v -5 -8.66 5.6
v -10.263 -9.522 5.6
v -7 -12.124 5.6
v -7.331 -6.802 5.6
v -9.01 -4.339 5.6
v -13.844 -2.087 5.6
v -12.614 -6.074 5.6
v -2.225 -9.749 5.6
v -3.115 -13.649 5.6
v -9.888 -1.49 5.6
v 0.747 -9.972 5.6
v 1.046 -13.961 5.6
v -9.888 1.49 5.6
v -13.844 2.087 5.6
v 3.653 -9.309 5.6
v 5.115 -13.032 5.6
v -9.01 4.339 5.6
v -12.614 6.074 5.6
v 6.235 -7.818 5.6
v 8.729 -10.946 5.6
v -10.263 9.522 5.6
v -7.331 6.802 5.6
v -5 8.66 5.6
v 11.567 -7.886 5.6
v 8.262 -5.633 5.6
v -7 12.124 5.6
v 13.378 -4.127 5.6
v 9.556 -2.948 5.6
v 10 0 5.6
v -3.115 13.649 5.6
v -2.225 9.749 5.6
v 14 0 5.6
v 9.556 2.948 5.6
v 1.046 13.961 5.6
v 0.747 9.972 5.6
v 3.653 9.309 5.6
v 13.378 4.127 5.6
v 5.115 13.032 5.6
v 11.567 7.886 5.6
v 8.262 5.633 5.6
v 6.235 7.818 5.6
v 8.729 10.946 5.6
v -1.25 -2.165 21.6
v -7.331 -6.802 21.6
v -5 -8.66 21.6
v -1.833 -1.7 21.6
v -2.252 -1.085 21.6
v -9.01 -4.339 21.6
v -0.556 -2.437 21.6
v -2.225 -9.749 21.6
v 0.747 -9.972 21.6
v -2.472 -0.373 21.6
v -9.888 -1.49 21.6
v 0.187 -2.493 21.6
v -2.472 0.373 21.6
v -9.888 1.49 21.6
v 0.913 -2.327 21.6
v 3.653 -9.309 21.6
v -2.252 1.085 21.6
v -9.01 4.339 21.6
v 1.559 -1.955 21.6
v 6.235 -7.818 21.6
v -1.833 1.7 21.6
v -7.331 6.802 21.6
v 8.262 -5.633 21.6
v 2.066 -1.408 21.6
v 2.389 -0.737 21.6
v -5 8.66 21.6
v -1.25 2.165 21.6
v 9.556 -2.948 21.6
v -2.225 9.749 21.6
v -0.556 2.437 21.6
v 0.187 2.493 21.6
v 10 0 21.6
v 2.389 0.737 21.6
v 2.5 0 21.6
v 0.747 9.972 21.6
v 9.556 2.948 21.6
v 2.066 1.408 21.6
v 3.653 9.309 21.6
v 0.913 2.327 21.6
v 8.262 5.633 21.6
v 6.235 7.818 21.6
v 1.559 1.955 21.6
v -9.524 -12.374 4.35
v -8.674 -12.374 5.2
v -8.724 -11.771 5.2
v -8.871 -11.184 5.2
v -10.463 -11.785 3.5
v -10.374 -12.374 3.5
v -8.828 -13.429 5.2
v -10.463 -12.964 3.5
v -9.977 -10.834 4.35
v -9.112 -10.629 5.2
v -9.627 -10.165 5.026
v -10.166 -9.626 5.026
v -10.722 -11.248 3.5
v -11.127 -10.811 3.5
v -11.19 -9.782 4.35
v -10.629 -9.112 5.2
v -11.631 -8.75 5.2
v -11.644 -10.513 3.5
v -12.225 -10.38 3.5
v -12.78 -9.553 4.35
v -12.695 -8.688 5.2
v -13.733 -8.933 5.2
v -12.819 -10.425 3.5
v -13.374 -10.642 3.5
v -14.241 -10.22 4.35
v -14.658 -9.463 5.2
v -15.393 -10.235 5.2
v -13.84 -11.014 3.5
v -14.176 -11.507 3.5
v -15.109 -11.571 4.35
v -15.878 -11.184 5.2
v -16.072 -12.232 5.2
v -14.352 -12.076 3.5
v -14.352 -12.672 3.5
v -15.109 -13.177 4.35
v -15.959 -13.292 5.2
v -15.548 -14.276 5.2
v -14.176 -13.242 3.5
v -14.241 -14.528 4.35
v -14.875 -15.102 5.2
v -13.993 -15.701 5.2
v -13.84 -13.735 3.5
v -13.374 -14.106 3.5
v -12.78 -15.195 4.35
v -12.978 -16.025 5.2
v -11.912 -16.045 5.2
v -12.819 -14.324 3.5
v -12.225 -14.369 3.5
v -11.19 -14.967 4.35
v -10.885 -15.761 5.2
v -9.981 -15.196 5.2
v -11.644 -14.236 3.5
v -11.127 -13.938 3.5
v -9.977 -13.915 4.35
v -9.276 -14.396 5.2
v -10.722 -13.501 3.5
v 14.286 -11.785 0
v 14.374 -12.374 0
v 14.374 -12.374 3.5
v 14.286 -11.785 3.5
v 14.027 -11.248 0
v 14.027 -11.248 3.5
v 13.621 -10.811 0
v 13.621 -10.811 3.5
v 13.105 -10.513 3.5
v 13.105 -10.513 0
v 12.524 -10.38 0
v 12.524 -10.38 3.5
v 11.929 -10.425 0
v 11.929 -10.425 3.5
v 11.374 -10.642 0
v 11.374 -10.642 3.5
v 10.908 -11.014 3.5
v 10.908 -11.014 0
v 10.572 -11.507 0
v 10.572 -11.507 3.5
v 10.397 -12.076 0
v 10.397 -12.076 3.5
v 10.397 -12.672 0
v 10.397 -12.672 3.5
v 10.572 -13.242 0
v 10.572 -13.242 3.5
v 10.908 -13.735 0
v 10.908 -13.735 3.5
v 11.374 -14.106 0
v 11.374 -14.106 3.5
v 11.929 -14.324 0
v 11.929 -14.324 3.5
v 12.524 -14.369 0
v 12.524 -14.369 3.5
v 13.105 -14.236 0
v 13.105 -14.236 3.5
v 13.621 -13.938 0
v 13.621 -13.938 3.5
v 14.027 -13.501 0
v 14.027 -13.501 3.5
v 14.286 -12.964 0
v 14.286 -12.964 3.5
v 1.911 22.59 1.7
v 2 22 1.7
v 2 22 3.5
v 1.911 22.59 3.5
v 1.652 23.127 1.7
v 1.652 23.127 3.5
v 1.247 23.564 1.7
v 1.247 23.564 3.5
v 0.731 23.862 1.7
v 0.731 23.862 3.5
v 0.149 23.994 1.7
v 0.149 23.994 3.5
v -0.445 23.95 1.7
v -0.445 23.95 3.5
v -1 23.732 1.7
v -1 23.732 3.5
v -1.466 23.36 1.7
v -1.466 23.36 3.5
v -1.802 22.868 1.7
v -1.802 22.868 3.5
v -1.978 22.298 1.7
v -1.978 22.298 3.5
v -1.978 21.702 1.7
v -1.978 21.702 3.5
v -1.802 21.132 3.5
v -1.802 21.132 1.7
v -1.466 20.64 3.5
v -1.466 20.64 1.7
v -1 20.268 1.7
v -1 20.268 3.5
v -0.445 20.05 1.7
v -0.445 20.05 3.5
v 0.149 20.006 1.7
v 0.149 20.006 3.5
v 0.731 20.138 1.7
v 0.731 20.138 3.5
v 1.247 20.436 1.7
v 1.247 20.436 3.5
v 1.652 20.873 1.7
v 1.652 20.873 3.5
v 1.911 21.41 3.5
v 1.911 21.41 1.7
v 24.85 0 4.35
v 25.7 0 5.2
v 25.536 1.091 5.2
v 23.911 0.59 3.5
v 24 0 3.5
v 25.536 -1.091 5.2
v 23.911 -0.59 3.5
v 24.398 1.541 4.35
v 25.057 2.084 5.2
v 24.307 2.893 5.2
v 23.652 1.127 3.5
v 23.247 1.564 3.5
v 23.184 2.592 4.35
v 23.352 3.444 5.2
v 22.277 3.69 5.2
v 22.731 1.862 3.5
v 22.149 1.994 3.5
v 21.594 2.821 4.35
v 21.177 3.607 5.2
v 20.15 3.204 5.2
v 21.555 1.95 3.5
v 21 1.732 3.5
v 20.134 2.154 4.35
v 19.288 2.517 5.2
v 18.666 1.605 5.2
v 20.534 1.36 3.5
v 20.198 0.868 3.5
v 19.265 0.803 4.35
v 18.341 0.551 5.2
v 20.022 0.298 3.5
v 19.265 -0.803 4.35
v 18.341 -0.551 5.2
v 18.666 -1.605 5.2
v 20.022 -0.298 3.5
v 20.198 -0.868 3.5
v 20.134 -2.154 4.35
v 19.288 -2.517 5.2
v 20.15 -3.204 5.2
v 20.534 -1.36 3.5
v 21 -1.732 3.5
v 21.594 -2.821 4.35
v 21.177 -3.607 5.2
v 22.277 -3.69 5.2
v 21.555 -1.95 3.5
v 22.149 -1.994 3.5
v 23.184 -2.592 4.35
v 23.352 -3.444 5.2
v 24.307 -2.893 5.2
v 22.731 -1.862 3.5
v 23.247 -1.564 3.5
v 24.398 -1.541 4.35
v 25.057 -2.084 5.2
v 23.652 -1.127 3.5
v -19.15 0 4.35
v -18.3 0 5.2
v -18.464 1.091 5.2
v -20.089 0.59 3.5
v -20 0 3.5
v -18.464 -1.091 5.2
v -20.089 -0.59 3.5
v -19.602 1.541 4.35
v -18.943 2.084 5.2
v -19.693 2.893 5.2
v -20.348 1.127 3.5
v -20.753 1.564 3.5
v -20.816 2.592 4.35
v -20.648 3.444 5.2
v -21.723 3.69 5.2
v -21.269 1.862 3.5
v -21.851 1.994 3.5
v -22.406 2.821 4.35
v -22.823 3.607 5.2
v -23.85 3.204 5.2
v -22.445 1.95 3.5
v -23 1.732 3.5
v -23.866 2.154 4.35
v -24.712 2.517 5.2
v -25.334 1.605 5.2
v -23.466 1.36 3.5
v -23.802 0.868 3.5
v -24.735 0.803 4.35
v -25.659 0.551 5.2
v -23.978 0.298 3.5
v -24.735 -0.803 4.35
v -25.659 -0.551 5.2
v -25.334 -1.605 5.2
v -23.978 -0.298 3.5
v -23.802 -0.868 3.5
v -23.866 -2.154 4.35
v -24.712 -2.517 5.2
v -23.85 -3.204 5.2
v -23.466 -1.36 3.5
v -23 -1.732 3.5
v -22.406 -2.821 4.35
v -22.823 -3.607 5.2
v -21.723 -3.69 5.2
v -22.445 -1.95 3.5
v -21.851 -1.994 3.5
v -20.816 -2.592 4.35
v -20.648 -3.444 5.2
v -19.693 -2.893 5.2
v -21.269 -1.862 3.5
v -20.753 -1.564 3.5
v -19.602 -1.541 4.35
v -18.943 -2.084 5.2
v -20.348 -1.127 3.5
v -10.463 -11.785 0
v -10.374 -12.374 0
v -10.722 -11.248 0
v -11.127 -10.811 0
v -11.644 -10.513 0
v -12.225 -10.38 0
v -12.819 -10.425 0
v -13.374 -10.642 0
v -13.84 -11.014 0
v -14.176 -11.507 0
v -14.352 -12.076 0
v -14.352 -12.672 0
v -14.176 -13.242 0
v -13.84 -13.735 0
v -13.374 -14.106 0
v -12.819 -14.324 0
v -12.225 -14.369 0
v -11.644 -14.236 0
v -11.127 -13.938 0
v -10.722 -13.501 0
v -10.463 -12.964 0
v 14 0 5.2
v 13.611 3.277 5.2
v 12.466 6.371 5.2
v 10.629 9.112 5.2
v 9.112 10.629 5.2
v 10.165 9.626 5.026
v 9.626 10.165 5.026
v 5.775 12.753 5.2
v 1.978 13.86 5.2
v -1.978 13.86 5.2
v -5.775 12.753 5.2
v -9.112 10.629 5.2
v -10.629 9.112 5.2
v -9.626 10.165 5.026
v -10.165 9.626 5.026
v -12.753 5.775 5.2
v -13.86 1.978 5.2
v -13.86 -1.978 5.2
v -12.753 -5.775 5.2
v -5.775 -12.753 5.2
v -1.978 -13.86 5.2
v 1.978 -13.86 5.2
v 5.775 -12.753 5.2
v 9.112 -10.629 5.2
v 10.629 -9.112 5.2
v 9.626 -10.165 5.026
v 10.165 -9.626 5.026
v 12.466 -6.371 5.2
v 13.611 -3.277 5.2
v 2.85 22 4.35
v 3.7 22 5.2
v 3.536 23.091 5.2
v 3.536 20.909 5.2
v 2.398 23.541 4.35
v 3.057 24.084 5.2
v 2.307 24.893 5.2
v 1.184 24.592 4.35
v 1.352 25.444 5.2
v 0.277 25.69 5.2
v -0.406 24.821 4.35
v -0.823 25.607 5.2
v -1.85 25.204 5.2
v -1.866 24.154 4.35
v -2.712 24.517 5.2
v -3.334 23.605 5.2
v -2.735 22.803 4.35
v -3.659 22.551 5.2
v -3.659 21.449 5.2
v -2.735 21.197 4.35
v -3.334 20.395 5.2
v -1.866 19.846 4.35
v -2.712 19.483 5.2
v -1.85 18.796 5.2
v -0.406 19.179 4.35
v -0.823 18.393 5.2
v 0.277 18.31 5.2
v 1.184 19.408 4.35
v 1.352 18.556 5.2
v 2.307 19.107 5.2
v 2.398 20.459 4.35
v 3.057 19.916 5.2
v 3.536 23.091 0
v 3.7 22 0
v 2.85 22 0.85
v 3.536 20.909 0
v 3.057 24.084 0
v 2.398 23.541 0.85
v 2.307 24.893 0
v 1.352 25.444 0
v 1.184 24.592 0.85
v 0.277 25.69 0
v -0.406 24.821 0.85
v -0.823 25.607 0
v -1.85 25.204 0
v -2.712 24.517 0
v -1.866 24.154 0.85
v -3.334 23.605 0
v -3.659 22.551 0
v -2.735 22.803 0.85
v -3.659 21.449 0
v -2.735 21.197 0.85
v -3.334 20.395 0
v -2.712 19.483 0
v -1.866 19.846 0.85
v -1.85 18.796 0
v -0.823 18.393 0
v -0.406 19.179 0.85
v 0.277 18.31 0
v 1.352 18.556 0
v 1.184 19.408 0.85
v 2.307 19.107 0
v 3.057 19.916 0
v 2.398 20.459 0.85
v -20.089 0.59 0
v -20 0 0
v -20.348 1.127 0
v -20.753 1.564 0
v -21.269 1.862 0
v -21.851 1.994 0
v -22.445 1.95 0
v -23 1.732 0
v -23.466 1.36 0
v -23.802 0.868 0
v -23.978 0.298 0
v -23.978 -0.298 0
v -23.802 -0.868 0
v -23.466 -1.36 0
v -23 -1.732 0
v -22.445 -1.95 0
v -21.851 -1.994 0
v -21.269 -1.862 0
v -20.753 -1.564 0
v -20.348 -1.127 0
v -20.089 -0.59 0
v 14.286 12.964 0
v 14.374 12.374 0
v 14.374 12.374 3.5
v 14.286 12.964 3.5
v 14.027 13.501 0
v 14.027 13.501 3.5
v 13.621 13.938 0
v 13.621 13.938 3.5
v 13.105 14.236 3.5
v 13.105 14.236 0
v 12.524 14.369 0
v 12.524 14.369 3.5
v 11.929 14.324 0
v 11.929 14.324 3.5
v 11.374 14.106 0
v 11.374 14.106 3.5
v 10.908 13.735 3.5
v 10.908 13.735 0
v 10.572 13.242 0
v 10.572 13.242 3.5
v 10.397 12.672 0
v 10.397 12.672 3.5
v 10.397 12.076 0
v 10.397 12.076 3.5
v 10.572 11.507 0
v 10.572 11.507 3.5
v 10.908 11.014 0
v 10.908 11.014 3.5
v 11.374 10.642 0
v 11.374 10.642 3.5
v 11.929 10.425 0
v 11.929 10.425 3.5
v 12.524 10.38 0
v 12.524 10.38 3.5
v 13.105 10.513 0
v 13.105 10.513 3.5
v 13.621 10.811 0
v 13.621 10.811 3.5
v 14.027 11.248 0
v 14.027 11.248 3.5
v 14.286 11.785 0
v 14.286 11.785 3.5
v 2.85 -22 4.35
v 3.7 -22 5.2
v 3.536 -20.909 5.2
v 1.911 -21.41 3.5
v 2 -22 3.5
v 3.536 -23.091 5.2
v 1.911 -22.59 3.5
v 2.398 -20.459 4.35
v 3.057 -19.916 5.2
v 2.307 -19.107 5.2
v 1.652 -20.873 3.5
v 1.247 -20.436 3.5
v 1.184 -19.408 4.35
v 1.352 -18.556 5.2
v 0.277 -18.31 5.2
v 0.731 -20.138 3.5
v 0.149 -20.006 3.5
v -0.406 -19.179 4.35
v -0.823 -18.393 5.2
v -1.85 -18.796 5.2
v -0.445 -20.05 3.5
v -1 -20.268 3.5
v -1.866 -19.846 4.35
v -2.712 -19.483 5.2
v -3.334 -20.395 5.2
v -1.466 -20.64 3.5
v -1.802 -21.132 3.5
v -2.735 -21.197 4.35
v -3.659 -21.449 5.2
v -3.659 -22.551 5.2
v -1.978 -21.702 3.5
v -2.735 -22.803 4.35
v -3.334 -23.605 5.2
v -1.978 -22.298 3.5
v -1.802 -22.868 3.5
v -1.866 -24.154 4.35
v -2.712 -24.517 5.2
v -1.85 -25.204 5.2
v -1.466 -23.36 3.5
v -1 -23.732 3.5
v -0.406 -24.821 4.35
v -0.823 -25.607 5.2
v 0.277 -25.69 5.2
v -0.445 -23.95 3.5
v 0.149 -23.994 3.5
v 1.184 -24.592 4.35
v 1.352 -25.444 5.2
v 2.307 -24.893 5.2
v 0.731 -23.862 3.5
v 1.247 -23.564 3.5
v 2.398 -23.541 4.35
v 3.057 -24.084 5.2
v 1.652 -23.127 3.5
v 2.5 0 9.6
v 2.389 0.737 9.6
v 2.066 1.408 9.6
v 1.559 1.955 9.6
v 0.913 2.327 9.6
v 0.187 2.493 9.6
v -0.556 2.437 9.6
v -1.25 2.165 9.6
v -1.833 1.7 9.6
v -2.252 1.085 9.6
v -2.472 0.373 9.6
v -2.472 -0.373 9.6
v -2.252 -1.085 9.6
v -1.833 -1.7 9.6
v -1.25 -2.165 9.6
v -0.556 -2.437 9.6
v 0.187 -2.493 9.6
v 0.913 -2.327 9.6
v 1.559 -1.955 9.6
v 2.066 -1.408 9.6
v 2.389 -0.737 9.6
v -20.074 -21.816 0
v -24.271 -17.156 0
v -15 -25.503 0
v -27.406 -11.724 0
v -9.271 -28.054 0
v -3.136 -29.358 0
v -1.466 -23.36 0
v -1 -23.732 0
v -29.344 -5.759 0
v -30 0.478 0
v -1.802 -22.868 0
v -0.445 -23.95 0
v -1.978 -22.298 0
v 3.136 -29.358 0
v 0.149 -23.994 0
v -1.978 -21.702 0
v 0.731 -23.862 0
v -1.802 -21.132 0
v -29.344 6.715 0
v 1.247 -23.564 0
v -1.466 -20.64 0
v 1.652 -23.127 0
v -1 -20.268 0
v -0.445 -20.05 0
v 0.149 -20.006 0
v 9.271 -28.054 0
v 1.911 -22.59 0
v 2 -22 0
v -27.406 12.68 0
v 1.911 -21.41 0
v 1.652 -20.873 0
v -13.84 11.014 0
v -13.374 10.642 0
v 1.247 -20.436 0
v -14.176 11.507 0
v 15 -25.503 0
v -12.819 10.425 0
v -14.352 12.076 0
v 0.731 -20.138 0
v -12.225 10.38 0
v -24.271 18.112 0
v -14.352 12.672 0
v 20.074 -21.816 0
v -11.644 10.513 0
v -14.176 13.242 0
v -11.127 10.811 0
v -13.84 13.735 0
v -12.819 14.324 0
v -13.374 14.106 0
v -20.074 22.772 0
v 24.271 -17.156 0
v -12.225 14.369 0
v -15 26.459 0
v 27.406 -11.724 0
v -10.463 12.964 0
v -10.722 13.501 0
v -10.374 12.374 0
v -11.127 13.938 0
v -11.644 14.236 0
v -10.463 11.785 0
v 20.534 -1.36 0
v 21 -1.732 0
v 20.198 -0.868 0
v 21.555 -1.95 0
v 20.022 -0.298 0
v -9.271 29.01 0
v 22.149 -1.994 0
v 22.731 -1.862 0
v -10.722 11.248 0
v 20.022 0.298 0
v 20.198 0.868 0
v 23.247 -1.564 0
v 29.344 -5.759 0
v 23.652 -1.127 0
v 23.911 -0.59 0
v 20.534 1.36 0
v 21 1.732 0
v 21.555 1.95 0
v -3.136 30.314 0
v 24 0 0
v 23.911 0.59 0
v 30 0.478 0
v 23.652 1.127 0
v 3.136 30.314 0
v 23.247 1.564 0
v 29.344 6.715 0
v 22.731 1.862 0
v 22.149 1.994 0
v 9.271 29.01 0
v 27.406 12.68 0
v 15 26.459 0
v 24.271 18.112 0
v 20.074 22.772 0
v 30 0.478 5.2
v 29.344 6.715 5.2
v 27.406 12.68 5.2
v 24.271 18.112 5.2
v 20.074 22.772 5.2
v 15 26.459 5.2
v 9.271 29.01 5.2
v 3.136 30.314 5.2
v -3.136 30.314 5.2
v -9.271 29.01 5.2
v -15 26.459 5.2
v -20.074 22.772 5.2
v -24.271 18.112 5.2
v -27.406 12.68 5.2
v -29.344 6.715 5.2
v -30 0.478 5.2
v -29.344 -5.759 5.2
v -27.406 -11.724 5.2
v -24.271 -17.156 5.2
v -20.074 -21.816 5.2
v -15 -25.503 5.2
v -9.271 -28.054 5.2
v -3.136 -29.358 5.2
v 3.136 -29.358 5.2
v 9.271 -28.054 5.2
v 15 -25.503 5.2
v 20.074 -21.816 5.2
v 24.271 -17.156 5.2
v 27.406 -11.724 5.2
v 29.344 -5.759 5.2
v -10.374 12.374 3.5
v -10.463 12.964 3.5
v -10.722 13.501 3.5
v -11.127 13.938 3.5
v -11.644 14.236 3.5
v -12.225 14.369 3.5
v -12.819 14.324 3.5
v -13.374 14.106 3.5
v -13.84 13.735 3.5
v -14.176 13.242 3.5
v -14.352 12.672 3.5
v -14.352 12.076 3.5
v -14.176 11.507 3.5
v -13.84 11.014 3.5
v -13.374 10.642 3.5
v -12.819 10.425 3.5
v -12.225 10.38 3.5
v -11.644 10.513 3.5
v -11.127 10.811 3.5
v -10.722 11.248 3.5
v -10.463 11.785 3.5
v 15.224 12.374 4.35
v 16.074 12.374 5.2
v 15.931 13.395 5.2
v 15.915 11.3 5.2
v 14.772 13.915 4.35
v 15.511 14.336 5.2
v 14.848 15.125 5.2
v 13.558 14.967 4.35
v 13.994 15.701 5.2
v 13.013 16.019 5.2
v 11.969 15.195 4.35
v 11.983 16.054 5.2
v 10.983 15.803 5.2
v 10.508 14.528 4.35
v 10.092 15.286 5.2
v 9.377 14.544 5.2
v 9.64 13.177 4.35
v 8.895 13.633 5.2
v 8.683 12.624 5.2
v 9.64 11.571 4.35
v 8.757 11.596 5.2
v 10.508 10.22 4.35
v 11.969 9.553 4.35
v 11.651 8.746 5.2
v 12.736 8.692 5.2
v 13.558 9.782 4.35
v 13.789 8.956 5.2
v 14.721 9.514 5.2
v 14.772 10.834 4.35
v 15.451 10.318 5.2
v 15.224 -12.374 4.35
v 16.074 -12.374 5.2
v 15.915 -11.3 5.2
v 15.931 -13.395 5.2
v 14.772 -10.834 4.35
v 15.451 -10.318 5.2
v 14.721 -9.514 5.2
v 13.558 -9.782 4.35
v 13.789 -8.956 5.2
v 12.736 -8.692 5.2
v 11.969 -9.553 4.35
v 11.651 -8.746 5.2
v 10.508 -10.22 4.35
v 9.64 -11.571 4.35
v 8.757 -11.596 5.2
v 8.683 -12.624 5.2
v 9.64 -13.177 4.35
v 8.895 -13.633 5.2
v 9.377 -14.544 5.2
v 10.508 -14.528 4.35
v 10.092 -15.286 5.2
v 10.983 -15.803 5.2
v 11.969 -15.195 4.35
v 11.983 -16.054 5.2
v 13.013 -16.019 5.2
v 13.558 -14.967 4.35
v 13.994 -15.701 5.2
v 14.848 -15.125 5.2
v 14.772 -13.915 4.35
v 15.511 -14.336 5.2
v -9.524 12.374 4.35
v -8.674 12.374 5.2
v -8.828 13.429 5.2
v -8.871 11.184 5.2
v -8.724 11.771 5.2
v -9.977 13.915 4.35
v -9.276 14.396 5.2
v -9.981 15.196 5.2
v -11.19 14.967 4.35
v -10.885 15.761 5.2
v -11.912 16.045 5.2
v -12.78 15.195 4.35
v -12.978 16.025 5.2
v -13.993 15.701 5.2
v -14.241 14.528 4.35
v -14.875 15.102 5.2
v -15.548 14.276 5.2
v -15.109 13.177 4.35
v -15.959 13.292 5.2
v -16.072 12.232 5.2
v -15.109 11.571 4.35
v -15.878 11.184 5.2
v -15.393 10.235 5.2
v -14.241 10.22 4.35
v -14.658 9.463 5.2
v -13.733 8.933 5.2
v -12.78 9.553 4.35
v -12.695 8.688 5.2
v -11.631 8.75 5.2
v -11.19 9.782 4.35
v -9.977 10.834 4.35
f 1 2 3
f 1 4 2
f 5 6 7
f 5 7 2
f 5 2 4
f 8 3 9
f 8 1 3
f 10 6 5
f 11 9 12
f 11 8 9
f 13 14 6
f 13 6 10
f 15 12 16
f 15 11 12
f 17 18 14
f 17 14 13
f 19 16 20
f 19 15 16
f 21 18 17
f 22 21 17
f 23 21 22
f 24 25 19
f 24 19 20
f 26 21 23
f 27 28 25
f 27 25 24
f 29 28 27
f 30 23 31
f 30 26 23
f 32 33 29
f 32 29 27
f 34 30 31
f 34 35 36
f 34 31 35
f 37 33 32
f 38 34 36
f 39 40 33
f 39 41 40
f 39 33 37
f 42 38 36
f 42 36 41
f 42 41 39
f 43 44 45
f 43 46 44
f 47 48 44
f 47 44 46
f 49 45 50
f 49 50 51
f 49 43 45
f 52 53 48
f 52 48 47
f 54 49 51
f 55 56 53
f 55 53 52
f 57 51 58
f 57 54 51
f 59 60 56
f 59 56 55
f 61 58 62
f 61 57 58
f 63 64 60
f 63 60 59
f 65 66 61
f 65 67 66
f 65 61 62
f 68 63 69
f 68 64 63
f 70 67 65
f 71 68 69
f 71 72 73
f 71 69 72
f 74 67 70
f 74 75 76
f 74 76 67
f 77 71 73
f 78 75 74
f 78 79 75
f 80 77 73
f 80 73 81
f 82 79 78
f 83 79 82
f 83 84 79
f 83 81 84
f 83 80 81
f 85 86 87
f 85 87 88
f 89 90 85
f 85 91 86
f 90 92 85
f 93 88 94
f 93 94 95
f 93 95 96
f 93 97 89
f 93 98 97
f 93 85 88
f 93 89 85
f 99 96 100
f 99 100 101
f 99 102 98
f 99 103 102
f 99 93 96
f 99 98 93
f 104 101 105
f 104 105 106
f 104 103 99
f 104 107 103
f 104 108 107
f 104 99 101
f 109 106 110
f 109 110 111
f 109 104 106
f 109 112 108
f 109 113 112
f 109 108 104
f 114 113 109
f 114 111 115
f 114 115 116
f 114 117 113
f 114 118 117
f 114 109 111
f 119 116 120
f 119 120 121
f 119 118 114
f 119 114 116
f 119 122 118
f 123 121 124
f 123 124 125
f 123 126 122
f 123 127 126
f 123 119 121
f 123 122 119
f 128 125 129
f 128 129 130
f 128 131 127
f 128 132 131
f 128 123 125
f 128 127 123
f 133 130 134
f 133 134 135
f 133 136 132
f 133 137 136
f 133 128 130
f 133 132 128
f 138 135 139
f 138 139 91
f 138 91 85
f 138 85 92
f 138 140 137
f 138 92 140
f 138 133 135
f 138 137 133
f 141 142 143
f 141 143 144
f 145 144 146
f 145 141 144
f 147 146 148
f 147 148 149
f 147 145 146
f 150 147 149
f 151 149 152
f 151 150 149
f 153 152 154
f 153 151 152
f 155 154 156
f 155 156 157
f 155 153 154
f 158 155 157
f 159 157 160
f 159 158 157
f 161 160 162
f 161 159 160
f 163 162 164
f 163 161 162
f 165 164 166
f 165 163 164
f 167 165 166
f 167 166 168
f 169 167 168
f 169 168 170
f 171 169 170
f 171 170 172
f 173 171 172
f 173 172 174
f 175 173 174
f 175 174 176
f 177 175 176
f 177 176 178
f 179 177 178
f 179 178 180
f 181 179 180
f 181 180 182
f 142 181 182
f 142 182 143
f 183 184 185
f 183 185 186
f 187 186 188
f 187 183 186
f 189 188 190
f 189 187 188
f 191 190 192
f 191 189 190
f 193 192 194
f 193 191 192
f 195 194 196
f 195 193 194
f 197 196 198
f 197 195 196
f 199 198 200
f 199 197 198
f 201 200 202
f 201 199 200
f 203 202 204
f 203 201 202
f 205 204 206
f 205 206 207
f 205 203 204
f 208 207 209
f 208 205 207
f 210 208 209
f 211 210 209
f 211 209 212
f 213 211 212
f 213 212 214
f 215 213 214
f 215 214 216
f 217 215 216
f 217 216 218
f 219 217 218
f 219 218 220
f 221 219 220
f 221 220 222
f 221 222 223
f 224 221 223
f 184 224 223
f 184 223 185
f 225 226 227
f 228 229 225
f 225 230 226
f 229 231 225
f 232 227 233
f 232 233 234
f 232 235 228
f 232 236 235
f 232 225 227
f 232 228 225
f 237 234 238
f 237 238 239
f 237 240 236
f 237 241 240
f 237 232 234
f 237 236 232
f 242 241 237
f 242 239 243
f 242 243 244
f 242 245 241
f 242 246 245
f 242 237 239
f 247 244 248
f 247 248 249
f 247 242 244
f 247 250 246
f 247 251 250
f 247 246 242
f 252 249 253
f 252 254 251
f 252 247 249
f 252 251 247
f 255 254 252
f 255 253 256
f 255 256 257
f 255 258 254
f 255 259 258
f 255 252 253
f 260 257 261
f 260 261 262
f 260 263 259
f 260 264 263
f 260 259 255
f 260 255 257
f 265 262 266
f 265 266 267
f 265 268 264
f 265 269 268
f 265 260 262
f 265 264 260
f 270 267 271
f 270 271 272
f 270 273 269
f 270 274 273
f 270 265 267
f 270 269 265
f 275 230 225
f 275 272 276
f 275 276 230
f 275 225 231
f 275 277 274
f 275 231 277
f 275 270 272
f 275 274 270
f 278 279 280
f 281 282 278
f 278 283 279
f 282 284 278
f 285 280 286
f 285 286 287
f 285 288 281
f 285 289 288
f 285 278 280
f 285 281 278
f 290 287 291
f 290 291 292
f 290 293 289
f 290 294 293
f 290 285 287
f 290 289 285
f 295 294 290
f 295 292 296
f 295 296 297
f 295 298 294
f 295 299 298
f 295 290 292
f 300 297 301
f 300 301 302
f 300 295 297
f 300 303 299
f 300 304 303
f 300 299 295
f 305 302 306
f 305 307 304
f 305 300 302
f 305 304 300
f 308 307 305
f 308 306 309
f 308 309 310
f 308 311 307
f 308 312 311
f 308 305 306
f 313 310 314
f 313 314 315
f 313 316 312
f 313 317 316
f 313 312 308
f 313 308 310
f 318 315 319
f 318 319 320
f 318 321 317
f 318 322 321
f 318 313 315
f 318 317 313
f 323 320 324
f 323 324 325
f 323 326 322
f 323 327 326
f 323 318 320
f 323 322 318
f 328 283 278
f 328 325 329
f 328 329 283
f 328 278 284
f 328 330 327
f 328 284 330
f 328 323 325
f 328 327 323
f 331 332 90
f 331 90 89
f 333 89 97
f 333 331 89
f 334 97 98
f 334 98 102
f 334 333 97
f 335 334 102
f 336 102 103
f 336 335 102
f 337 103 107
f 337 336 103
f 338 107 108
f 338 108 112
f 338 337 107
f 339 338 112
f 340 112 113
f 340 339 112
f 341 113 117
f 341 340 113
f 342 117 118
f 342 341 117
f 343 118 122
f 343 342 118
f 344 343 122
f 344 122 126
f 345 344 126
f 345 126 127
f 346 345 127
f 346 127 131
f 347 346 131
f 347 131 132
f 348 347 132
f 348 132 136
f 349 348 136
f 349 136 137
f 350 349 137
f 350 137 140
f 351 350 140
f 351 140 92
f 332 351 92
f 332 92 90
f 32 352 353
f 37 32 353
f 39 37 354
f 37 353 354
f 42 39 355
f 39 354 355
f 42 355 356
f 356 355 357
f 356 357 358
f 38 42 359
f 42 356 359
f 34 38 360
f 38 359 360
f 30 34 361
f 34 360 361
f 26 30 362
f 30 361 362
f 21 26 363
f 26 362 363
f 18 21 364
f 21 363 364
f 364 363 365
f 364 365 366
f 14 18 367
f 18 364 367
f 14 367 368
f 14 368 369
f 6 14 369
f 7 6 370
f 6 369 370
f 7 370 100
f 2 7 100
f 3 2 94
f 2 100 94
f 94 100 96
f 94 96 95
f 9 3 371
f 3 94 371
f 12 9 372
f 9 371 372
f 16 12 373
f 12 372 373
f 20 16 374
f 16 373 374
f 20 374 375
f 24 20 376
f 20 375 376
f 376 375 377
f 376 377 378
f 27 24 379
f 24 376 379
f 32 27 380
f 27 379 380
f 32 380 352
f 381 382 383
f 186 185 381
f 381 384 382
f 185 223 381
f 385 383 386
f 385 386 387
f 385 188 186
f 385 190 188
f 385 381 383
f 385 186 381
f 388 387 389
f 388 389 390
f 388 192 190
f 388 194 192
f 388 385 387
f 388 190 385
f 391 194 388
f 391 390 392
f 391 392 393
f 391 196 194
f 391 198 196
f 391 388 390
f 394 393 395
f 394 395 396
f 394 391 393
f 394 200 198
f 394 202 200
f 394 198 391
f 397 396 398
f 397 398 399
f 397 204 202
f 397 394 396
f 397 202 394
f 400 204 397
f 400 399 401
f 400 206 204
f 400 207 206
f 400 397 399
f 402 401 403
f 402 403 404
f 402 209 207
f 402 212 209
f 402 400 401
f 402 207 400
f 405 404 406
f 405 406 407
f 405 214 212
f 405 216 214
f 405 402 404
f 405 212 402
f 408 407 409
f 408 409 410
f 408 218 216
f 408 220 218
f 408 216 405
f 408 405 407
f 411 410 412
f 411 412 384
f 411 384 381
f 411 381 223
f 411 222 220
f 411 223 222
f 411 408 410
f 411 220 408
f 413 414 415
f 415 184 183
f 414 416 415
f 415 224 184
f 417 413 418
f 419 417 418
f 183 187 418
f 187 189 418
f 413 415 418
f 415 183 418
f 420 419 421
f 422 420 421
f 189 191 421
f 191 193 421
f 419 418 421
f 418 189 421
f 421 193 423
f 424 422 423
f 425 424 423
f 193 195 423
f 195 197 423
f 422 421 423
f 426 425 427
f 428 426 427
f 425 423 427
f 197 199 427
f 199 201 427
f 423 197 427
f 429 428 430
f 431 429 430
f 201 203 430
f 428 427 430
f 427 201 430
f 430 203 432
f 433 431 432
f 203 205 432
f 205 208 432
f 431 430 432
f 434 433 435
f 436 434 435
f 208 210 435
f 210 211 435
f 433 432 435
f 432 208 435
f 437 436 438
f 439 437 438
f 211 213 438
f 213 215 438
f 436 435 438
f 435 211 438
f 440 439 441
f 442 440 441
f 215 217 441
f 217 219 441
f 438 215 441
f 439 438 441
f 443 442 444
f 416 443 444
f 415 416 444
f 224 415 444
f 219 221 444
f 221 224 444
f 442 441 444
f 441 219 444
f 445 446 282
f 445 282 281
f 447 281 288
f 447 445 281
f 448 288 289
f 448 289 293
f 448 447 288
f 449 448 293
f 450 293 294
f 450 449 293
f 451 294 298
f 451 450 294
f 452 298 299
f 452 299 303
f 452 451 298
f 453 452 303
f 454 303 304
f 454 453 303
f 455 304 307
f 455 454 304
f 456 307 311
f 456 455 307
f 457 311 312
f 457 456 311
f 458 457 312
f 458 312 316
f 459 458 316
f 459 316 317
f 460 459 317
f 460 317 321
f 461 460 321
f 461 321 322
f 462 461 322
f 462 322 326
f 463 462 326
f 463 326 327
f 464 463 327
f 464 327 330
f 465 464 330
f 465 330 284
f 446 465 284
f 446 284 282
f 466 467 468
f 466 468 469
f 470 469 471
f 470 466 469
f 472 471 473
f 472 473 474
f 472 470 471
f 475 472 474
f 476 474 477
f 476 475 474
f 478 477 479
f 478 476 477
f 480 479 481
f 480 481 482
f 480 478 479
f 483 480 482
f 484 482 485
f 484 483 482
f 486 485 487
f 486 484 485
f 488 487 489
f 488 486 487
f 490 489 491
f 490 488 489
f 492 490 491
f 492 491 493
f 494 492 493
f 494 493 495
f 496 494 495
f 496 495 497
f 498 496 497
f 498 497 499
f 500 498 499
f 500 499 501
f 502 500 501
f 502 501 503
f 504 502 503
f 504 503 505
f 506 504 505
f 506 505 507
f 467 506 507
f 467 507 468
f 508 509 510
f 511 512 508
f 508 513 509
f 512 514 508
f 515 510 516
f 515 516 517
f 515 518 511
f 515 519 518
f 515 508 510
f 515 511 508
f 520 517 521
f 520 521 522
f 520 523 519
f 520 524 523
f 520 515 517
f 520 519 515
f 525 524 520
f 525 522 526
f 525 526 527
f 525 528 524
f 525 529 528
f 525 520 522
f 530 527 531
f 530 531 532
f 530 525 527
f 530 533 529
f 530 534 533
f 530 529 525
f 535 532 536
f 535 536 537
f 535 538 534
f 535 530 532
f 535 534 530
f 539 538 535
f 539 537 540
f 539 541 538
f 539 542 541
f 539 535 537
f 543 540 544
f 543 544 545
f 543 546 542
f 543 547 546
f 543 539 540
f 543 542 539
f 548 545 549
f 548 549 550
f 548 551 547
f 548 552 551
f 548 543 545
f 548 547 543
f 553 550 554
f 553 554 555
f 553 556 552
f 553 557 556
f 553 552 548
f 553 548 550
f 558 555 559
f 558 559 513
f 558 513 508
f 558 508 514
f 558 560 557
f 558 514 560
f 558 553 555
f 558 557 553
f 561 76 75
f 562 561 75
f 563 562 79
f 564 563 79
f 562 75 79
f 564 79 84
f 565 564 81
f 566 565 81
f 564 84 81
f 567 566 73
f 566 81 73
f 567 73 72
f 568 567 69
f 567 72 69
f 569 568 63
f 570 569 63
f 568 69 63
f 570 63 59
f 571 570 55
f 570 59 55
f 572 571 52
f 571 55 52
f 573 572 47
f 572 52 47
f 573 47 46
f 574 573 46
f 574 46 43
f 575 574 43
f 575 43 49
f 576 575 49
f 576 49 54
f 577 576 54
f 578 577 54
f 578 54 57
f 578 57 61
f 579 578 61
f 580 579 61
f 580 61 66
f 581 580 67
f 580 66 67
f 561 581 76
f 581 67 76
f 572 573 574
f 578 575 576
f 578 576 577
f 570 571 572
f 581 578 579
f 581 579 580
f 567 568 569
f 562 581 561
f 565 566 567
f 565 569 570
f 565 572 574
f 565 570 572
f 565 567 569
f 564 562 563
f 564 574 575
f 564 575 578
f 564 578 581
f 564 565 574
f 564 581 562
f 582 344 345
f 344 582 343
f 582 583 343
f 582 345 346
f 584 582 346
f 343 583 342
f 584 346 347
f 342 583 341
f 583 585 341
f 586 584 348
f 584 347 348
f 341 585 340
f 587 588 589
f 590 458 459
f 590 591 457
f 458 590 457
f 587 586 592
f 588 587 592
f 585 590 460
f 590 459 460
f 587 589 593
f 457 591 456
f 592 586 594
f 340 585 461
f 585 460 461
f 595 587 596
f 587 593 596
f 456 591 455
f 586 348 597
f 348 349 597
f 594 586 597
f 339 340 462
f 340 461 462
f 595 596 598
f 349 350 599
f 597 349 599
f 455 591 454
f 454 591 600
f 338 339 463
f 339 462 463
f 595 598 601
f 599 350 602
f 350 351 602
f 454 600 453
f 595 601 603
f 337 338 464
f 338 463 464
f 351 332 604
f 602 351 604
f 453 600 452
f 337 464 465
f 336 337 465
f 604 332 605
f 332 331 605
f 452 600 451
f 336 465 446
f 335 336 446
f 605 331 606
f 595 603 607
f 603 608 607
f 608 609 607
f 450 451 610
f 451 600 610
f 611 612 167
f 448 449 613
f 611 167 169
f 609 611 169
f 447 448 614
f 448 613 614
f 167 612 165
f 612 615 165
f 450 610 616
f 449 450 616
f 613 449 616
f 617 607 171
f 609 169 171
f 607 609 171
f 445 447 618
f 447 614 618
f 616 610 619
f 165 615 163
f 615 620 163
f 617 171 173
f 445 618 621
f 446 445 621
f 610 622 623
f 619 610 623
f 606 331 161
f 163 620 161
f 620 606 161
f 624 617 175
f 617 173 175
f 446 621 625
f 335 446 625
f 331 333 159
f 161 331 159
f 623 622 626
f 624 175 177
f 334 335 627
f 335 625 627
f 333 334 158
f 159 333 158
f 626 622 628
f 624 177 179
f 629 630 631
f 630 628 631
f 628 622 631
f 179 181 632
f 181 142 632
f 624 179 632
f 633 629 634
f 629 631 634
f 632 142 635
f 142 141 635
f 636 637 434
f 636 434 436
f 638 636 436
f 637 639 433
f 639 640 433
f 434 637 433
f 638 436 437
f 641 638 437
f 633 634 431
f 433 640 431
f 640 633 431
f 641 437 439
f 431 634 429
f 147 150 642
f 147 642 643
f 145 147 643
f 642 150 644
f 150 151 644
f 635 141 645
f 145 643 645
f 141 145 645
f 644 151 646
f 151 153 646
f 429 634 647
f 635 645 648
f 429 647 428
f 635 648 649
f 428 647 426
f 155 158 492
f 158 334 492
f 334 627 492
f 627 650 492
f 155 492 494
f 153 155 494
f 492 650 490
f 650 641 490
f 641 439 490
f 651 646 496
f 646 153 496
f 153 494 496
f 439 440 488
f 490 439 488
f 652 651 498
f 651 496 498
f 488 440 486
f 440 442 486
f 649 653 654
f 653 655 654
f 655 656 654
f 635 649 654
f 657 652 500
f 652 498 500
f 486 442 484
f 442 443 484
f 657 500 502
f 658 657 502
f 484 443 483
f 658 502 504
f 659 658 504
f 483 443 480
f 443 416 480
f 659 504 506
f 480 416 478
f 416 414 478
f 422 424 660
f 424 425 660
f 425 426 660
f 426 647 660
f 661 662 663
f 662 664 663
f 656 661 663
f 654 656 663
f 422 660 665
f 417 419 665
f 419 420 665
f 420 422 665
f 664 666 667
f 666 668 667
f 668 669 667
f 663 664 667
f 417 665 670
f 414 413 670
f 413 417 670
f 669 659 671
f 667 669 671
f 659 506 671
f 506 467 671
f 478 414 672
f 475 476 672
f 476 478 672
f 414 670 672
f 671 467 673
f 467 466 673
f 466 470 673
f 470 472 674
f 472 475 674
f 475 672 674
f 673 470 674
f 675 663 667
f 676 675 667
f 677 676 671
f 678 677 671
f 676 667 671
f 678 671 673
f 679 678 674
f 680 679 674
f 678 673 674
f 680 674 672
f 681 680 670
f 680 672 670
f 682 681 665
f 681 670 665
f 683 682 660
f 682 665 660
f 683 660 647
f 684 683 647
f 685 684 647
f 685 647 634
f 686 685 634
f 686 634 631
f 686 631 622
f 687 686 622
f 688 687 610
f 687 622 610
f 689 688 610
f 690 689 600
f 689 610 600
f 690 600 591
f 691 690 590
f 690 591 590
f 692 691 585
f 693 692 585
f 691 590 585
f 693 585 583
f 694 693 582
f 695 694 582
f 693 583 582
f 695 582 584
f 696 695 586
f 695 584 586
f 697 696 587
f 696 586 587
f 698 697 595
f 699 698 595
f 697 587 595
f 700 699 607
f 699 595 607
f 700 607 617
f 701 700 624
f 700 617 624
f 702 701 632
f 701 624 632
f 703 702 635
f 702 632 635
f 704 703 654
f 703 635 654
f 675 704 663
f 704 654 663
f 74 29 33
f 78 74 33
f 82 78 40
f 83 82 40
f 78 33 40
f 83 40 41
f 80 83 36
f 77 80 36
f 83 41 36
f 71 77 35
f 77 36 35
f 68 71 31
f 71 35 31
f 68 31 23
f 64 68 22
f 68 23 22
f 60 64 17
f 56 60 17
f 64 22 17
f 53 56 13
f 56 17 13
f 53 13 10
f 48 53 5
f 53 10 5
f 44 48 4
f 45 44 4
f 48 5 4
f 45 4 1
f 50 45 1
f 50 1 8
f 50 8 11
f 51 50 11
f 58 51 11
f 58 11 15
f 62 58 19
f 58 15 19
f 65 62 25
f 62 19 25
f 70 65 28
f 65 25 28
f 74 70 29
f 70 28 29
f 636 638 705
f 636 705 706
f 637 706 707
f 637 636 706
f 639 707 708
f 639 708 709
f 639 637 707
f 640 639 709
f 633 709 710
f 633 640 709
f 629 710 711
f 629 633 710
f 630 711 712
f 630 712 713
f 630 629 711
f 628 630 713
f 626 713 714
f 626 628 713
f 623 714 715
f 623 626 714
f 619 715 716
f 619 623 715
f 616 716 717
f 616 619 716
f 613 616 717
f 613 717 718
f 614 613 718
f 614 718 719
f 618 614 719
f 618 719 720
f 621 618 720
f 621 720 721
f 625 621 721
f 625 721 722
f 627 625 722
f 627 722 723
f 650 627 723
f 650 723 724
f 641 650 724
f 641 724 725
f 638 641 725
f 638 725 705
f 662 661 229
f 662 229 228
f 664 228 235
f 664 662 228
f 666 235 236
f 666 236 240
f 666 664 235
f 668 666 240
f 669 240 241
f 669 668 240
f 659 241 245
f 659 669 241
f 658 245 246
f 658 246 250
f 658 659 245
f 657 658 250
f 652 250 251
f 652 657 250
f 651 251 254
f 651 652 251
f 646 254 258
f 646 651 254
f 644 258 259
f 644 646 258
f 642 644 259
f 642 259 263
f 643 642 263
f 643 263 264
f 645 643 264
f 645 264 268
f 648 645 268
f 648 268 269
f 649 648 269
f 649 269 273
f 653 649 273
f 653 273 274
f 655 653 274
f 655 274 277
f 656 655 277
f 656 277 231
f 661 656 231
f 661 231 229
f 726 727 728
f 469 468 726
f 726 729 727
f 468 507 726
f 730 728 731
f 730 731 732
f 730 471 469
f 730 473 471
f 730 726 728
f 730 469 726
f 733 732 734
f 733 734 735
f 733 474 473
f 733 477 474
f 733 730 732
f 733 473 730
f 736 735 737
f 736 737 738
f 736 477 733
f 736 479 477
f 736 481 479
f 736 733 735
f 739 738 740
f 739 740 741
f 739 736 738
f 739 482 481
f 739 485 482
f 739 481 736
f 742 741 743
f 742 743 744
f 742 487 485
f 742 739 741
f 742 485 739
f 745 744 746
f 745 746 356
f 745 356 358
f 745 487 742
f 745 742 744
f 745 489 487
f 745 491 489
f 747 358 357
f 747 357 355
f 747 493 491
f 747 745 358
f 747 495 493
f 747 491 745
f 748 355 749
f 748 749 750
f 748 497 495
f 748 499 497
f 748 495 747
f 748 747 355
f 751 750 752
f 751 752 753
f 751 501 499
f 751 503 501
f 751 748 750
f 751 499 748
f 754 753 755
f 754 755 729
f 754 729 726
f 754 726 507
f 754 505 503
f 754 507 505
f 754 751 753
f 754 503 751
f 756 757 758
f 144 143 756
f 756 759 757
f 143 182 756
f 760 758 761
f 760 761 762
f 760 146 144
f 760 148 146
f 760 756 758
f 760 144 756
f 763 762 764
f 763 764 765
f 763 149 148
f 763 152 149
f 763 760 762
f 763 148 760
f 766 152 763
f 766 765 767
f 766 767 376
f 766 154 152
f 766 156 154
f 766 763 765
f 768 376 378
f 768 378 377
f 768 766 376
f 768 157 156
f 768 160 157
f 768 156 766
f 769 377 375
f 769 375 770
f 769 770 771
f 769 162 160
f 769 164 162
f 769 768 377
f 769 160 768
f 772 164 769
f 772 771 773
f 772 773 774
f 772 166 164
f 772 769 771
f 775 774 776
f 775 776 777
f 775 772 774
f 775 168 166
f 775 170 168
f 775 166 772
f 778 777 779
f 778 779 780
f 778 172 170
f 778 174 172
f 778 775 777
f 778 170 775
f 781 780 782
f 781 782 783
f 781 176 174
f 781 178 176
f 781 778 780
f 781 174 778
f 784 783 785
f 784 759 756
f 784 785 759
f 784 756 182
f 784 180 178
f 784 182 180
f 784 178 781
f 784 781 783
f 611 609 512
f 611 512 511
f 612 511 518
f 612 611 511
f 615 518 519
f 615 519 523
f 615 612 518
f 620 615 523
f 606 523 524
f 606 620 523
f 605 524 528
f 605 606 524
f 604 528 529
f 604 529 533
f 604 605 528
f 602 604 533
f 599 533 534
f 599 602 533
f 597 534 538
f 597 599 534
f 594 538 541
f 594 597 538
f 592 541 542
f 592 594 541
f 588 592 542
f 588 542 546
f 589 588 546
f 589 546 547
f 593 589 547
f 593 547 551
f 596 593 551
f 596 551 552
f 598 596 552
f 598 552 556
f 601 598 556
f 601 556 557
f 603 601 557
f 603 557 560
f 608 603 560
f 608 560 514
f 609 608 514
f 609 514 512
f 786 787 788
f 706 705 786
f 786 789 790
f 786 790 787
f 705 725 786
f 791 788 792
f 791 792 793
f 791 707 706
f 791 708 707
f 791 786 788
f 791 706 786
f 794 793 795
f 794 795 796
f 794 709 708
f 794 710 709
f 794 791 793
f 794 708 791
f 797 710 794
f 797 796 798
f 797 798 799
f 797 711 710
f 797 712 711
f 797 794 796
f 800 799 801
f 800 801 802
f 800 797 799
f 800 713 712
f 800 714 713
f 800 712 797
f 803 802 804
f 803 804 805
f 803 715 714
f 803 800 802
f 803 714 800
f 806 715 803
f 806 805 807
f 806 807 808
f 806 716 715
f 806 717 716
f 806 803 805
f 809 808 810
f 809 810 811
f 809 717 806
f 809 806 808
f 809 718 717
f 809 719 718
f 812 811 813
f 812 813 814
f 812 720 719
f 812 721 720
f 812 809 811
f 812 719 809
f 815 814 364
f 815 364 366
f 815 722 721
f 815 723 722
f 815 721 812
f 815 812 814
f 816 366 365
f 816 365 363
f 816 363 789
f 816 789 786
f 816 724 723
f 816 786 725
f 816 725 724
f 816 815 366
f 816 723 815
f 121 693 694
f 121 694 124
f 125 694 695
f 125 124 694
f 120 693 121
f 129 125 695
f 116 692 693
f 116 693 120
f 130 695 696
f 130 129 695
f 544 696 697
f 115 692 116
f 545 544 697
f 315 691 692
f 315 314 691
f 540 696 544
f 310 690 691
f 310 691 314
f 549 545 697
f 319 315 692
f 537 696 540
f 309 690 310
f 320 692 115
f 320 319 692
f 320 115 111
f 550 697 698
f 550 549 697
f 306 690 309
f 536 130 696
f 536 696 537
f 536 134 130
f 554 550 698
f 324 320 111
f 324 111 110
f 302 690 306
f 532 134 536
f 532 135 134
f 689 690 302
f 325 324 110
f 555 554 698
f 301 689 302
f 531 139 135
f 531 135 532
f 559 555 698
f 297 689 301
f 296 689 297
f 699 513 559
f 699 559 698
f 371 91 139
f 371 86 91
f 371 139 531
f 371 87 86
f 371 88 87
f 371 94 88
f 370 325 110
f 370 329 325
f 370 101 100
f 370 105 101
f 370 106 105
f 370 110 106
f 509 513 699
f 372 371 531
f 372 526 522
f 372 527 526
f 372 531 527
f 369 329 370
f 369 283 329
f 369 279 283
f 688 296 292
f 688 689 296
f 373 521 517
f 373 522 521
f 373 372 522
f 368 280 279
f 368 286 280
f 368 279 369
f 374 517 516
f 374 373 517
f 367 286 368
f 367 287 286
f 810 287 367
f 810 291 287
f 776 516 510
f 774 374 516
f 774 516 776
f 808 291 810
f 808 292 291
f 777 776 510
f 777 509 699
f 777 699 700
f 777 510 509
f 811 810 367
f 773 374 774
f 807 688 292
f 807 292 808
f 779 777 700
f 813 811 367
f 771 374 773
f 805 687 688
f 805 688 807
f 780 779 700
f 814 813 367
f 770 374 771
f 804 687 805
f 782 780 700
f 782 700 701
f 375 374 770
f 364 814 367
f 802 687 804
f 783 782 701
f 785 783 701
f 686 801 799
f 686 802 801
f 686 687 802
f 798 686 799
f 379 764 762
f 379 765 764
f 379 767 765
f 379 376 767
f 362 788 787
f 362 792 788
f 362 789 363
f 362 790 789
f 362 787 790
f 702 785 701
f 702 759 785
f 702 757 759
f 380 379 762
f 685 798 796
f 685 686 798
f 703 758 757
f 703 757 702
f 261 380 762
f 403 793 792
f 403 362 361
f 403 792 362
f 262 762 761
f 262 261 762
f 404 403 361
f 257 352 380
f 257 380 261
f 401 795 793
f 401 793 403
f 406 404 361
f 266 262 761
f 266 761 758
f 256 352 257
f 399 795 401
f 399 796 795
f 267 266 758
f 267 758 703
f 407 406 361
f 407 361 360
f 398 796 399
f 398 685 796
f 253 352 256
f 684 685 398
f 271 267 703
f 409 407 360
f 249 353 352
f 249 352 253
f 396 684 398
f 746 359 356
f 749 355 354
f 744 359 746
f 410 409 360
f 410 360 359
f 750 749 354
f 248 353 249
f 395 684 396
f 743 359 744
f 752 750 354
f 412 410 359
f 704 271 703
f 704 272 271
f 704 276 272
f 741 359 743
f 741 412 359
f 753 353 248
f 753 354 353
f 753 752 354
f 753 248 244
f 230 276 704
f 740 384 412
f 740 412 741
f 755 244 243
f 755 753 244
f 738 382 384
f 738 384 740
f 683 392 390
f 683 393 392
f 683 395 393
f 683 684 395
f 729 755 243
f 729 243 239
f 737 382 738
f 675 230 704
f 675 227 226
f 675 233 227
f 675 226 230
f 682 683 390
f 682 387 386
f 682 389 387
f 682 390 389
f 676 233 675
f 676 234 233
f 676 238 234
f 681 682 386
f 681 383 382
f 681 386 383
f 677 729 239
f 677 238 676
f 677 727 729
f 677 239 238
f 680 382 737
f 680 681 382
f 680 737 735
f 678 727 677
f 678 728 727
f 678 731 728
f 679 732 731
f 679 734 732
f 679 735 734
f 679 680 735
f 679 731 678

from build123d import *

# Parameters (mm, degrees)
SKETCH_1_R          = 30
SKETCH_1_R_2        = 2
EXTRUDE_1_DEPTH     = 5.2
SKETCH_2_R          = 14
EXTRUDE_2_DEPTH     = 0.4
SKETCH_3_R          = 10
EXTRUDE_3_DEPTH     = 16
SKETCH_4_R          = 2.5
CUT_EXTRUDE_1_DEPTH = 12
CHAMFER_1_SIZE      = 1.7


with BuildPart() as part:
    # 草图1 → 凸台-拉伸1 (new body)
    with BuildSketch(Plane.XY):
        with Locations((0, 0.477974548)):
            Circle(SKETCH_1_R)
        with Locations((0, 22)):
            Circle(SKETCH_1_R_2, mode=Mode.SUBTRACT)
        with Locations((-12.374368671, 12.374368671)):
            Circle(SKETCH_1_R_2, mode=Mode.SUBTRACT)
        with Locations((22, 0)):
            Circle(SKETCH_1_R_2, mode=Mode.SUBTRACT)
        with Locations((12.374368671, 12.374368671)):
            Circle(SKETCH_1_R_2, mode=Mode.SUBTRACT)
        with Locations((0, -22)):
            Circle(SKETCH_1_R_2, mode=Mode.SUBTRACT)
        with Locations((12.374368671, -12.374368671)):
            Circle(SKETCH_1_R_2, mode=Mode.SUBTRACT)
        with Locations((-22, 0)):
            Circle(SKETCH_1_R_2, mode=Mode.SUBTRACT)
        with Locations((-12.374368671, -12.374368671)):
            Circle(SKETCH_1_R_2, mode=Mode.SUBTRACT)
    extrude(amount=EXTRUDE_1_DEPTH)

    # 草图2 → 凸台-拉伸2 (add)
    with BuildSketch(Plane.XY.offset(5.2)):
        Circle(SKETCH_2_R)
    extrude(amount=EXTRUDE_2_DEPTH)

    # 草图3 → 凸台-拉伸3 (add)
    with BuildSketch(Plane.XY.offset(5.6)):
        Circle(SKETCH_3_R)
    extrude(amount=EXTRUDE_3_DEPTH)

    # 草图4 → 切除-拉伸1 (cut)
    with BuildSketch(Plane.XY.offset(21.6)):
        Circle(SKETCH_4_R)
    extrude(amount=-CUT_EXTRUDE_1_DEPTH, mode=Mode.SUBTRACT)

    # 倒角1
    # the kernel refuses this chamfer: 1.7 mm, written as the material it takes off along each edge
    with BuildSketch(Plane(origin=(22, 0, 5.2), x_dir=(1, 0, 0), z_dir=(0, -1, 0))) as chamfer_1_piece_1:
        Polygon((2 + CHAMFER_1_SIZE, 0), (2, -CHAMFER_1_SIZE), (2, 0), align=None)
    revolve(axis=Axis((22, 0, 5.2), (0, 0, 1)), mode=Mode.SUBTRACT)
    with BuildSketch(Plane(origin=(12.374368671, 12.374368671, 5.2), x_dir=(1, 0, 0), z_dir=(0, -1, 0))) as chamfer_1_piece_2_section:
        Polygon((2 + CHAMFER_1_SIZE, 0), (2, -CHAMFER_1_SIZE), (2, 0), align=None)
    chamfer_1_piece_2 = revolve(axis=Axis((12.374368671, 12.374368671, 5.2), (0, 0, 1)), mode=Mode.PRIVATE)
    chamfer_1_piece_2 = chamfer_1_piece_2 - Plane(origin=(0, 0, 4.370822152), x_dir=(1, 0, 0), z_dir=(0, 0, -1)) * Cylinder(14, 15, mode=Mode.PRIVATE)
    add(chamfer_1_piece_2, mode=Mode.SUBTRACT)
    with BuildSketch(Plane(origin=(0, -22, 5.2), x_dir=(1, 0, 0), z_dir=(0, -1, 0))) as chamfer_1_piece_3:
        Polygon((2 + CHAMFER_1_SIZE, 0), (2, -CHAMFER_1_SIZE), (2, 0), align=None)
    revolve(axis=Axis((0, -22, 5.2), (0, 0, 1)), mode=Mode.SUBTRACT)
    with BuildSketch(Plane(origin=(12.374368671, -12.374368671, 5.2), x_dir=(1, 0, 0), z_dir=(0, -1, 0))) as chamfer_1_piece_4_section:
        Polygon((2 + CHAMFER_1_SIZE, 0), (2, -CHAMFER_1_SIZE), (2, 0), align=None)
    chamfer_1_piece_4 = revolve(axis=Axis((12.374368671, -12.374368671, 5.2), (0, 0, 1)), mode=Mode.PRIVATE)
    chamfer_1_piece_4 = chamfer_1_piece_4 - Plane(origin=(0, 0, 4.370822149), x_dir=(1, 0, 0), z_dir=(0, 0, -1)) * Cylinder(14, 15, mode=Mode.PRIVATE)
    add(chamfer_1_piece_4, mode=Mode.SUBTRACT)
    with BuildSketch(Plane(origin=(-22, 0, 5.2), x_dir=(1, 0, 0), z_dir=(0, -1, 0))) as chamfer_1_piece_5:
        Polygon((2 + CHAMFER_1_SIZE, 0), (2, -CHAMFER_1_SIZE), (2, 0), align=None)
    revolve(axis=Axis((-22, 0, 5.2), (0, 0, 1)), mode=Mode.SUBTRACT)
    with BuildSketch(Plane(origin=(-12.374368671, -12.374368671, 5.2), x_dir=(1, 0, 0), z_dir=(0, -1, 0))) as chamfer_1_piece_6_section:
        Polygon((2 + CHAMFER_1_SIZE, 0), (2, -CHAMFER_1_SIZE), (2, 0), align=None)
    chamfer_1_piece_6 = revolve(axis=Axis((-12.374368671, -12.374368671, 5.2), (0, 0, 1)), mode=Mode.PRIVATE)
    chamfer_1_piece_6 = chamfer_1_piece_6 - Plane(origin=(0, 0, 4.370822148), x_dir=(1, 0, 0), z_dir=(0, 0, -1)) * Cylinder(14, 15, mode=Mode.PRIVATE)
    add(chamfer_1_piece_6, mode=Mode.SUBTRACT)
    with BuildSketch(Plane(origin=(0, 22, 0), x_dir=(1, 0, 0), z_dir=(0, -1, 0))) as chamfer_1_piece_7:
        Polygon((2 + CHAMFER_1_SIZE, 0), (2, CHAMFER_1_SIZE), (2, 0), align=None)
    revolve(axis=Axis((0, 22, 0), (0, 0, 1)), mode=Mode.SUBTRACT)
    with BuildSketch(Plane(origin=(0, 22, 5.2), x_dir=(1, 0, 0), z_dir=(0, -1, 0))) as chamfer_1_piece_8:
        Polygon((2 + CHAMFER_1_SIZE, 0), (2, -CHAMFER_1_SIZE), (2, 0), align=None)
    revolve(axis=Axis((0, 22, 5.2), (0, 0, 1)), mode=Mode.SUBTRACT)
    with BuildSketch(Plane(origin=(-12.374368671, 12.374368671, 5.2), x_dir=(1, 0, 0), z_dir=(0, -1, 0))) as chamfer_1_piece_9_section:
        Polygon((2 + CHAMFER_1_SIZE, 0), (2, -CHAMFER_1_SIZE), (2, 0), align=None)
    chamfer_1_piece_9 = revolve(axis=Axis((-12.374368671, 12.374368671, 5.2), (0, 0, 1)), mode=Mode.PRIVATE)
    chamfer_1_piece_9 = chamfer_1_piece_9 - Plane(origin=(0, 0, 4.370822151), x_dir=(1, 0, 0), z_dir=(0, 0, -1)) * Cylinder(14, 15, mode=Mode.PRIVATE)
    add(chamfer_1_piece_9, mode=Mode.SUBTRACT)


solid = part.part
